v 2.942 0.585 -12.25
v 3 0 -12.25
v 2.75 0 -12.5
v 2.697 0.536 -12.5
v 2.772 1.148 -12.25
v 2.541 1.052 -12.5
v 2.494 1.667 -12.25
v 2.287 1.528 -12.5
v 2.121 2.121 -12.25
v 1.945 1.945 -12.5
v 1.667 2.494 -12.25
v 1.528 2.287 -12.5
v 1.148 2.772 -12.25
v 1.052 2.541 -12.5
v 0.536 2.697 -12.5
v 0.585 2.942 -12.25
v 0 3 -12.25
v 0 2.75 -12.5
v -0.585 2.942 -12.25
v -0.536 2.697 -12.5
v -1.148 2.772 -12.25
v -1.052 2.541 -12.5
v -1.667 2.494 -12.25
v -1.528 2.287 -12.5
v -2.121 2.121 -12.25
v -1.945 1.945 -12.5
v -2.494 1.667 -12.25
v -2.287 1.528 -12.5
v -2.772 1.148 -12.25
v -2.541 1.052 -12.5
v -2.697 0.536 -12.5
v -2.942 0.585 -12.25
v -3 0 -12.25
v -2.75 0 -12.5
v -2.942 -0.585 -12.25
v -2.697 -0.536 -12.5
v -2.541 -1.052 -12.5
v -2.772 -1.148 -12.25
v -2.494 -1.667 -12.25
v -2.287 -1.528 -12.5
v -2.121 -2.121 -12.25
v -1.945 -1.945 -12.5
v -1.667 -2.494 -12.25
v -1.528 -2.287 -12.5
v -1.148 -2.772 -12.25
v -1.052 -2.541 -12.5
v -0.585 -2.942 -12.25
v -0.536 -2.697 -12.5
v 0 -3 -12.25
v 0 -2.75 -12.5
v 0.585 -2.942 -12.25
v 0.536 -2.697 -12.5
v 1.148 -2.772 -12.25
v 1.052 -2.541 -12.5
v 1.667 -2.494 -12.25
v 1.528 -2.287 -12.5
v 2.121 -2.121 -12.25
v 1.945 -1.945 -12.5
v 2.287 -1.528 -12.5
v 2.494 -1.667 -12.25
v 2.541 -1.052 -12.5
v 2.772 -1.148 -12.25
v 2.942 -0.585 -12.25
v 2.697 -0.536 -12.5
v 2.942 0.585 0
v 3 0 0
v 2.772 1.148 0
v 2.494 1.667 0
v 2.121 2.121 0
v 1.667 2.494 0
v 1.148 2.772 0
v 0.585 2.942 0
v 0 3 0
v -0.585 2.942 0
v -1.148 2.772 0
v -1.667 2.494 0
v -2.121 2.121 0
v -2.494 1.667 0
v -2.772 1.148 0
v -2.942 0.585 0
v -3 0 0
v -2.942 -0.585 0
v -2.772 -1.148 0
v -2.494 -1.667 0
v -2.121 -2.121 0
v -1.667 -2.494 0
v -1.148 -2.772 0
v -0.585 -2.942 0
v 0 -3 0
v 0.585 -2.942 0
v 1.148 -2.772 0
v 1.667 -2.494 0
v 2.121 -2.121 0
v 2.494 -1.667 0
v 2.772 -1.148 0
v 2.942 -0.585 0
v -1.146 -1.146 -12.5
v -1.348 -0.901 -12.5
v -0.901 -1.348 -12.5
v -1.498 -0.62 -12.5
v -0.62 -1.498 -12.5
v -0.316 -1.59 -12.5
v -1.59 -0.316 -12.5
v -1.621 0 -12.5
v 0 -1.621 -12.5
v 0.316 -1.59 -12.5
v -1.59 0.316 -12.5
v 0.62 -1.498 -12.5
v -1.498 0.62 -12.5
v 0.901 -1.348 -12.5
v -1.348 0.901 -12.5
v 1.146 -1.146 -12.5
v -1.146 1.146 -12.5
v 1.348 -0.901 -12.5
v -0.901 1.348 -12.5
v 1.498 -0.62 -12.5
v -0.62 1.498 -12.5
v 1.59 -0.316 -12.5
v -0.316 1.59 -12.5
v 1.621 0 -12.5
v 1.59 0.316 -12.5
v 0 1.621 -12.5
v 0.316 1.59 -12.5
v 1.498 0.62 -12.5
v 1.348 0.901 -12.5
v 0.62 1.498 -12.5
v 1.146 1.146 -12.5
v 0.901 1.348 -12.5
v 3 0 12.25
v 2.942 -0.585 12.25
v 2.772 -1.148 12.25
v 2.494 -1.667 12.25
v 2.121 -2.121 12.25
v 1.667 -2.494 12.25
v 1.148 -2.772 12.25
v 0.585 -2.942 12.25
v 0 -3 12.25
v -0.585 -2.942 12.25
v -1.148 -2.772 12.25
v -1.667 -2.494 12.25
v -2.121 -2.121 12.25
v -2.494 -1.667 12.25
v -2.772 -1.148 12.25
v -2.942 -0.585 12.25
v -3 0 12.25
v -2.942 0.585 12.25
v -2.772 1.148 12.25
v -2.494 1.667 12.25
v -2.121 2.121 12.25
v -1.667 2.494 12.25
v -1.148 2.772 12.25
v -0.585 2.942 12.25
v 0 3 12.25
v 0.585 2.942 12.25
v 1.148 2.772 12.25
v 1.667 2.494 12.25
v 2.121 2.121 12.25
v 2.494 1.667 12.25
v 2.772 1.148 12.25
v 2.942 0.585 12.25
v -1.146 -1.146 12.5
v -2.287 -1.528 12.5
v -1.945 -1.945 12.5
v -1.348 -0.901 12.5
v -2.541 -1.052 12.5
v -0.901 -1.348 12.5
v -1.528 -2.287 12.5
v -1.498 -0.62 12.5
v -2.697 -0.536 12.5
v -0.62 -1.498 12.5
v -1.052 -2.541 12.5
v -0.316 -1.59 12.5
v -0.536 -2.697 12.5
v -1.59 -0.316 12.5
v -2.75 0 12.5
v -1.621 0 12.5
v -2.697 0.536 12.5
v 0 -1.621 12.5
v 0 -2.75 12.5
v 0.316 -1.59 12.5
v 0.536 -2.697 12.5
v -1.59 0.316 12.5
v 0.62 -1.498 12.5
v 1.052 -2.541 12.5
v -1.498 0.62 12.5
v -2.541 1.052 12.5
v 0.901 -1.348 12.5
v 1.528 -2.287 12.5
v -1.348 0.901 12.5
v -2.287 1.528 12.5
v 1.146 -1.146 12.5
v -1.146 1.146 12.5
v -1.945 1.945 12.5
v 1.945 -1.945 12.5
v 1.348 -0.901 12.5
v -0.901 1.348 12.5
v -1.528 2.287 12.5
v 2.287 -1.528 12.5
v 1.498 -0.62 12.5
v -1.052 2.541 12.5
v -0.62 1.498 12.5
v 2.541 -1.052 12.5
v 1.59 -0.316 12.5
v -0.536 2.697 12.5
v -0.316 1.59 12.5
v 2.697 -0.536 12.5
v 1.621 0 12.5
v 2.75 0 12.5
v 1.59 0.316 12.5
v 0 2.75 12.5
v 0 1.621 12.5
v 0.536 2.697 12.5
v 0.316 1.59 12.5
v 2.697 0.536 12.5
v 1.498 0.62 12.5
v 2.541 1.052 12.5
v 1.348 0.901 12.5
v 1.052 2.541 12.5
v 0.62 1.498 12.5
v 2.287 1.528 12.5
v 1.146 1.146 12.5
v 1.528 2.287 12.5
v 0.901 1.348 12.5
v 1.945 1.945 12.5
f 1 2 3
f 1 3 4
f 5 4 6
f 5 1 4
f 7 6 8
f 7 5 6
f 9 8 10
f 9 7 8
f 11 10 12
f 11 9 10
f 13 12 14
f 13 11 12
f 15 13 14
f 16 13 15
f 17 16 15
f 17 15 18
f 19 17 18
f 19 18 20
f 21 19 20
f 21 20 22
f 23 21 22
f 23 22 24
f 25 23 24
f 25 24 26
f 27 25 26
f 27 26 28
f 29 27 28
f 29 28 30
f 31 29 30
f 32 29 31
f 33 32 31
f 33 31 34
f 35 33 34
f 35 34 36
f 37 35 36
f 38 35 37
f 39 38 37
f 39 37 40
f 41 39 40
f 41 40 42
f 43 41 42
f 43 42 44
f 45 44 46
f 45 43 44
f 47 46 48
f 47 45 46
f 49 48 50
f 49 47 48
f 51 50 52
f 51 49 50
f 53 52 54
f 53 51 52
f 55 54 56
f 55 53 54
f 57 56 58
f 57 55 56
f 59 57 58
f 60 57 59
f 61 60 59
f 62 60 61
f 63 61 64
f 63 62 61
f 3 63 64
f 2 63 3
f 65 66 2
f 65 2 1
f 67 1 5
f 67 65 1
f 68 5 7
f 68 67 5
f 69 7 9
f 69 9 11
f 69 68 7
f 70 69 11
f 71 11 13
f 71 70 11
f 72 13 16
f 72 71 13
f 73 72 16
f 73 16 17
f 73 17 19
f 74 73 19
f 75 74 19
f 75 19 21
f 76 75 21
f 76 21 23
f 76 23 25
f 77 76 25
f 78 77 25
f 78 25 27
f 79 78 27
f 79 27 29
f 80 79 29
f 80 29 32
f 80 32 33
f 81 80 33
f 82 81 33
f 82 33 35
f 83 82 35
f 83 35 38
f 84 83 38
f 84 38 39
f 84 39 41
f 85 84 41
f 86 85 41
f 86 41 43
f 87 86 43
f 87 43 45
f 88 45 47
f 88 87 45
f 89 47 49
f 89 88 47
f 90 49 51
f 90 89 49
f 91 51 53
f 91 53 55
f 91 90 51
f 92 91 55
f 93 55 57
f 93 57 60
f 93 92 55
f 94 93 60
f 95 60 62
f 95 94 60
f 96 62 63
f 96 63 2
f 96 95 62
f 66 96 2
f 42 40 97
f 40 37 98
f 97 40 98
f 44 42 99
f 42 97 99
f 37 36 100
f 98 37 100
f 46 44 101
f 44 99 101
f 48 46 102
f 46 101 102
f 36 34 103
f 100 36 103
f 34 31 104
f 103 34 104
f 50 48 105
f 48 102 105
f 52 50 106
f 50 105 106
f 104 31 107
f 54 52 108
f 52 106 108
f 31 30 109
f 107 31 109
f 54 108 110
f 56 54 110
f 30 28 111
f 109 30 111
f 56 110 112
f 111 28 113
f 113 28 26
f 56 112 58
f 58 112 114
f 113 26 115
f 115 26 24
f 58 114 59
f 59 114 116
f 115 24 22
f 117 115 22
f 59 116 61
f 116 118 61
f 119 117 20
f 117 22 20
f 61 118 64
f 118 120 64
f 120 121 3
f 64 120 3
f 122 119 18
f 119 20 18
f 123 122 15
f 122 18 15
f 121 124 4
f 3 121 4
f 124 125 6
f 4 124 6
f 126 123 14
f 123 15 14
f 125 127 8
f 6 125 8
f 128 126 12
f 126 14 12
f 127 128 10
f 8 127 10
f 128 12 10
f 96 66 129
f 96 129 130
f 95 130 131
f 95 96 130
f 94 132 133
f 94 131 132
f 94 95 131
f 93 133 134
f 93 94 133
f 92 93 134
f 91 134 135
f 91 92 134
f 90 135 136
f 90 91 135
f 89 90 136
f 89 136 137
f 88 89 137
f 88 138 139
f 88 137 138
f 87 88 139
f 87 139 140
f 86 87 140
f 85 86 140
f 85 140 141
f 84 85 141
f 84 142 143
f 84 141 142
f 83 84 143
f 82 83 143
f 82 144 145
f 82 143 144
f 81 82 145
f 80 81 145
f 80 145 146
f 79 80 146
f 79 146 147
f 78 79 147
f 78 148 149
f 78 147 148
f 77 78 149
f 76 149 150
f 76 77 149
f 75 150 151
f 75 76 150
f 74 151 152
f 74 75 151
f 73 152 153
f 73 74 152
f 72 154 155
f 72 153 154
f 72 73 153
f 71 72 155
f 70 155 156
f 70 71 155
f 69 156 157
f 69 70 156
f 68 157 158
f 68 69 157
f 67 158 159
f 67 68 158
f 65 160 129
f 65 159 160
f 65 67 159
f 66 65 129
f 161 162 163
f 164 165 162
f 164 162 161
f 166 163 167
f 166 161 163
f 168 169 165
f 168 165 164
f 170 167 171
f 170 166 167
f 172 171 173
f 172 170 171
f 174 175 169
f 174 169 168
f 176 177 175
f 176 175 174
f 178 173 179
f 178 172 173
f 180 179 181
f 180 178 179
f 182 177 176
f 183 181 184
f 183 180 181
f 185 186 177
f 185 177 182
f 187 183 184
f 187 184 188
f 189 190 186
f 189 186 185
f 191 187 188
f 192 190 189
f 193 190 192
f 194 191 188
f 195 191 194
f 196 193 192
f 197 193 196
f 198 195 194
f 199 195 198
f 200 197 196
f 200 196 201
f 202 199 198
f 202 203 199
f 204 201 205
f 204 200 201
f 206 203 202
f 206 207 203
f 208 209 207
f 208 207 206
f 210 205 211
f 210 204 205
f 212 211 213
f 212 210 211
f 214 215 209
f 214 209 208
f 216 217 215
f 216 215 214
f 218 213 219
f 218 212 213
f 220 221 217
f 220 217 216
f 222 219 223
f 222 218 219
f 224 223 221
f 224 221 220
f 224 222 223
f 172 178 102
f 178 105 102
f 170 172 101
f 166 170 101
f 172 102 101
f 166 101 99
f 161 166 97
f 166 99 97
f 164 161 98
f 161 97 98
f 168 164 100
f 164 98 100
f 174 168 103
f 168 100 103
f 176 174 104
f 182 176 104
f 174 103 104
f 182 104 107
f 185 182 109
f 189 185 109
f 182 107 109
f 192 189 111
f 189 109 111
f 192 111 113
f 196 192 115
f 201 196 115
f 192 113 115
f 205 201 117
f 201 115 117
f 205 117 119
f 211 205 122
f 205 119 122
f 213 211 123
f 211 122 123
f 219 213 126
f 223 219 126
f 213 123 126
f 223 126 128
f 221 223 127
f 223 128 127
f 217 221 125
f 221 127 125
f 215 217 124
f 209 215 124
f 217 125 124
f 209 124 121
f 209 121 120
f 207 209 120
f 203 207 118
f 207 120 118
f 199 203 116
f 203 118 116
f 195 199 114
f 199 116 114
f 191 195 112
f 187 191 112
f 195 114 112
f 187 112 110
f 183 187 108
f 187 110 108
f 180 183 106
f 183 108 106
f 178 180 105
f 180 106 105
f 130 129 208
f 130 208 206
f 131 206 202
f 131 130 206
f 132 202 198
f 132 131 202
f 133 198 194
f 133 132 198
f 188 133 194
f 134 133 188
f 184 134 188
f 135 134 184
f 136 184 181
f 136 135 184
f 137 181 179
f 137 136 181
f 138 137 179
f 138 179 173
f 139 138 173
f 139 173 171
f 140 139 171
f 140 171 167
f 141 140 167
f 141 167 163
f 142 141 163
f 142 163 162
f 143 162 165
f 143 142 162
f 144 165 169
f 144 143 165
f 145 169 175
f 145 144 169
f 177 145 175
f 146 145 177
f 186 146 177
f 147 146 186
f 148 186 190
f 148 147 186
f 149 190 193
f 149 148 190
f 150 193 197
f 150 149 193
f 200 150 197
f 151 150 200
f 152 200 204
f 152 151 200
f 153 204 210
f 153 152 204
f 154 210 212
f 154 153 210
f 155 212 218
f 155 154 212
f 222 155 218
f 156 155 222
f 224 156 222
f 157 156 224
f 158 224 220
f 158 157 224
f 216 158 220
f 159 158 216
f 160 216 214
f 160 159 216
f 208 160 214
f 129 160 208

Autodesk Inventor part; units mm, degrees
ref_plane "YZ Plane" through (0, 0, 0) normal (1, 0, 0) x (0, 1, 0)
ref_plane "XZ Plane" through (0, 0, 0) normal (0, 1, 0) x (-1, 0, 0)
ref_plane "XY Plane" through (0, 0, 0) normal (0, 0, 1) x (1, 0, 0)
sketch "Sketch1" plane through (0, 0, 0) normal (0, 0, 1) x (1, 0, 0)
  circle A0 centre (0, 0) radius 3
  dimension "d0" = 6
extrude "Extrusion1" add sketch "Sketch1" along normal mid plane 25
sketch "Sketch2" plane through (0, 0, 12.5) normal (0, 0, 1) x (1, 0, 0)
  point P0 (0, 0)
  point P1 (2.8235, 0.7984)
hole "Hole1" at (0, 0, 12.5) direction (0, 0, -1) diameter 3.242 end up to surface thread size "M4x0.7" class "6H" standard "ISO Metric profile"
chamfer "Chamfer1" distance 0.25 angle 45 2 edges at (-3, 0, 12.5) (-3, 0, -12.5)
properties part number "FootPin" material "Acetal Resin, White"
